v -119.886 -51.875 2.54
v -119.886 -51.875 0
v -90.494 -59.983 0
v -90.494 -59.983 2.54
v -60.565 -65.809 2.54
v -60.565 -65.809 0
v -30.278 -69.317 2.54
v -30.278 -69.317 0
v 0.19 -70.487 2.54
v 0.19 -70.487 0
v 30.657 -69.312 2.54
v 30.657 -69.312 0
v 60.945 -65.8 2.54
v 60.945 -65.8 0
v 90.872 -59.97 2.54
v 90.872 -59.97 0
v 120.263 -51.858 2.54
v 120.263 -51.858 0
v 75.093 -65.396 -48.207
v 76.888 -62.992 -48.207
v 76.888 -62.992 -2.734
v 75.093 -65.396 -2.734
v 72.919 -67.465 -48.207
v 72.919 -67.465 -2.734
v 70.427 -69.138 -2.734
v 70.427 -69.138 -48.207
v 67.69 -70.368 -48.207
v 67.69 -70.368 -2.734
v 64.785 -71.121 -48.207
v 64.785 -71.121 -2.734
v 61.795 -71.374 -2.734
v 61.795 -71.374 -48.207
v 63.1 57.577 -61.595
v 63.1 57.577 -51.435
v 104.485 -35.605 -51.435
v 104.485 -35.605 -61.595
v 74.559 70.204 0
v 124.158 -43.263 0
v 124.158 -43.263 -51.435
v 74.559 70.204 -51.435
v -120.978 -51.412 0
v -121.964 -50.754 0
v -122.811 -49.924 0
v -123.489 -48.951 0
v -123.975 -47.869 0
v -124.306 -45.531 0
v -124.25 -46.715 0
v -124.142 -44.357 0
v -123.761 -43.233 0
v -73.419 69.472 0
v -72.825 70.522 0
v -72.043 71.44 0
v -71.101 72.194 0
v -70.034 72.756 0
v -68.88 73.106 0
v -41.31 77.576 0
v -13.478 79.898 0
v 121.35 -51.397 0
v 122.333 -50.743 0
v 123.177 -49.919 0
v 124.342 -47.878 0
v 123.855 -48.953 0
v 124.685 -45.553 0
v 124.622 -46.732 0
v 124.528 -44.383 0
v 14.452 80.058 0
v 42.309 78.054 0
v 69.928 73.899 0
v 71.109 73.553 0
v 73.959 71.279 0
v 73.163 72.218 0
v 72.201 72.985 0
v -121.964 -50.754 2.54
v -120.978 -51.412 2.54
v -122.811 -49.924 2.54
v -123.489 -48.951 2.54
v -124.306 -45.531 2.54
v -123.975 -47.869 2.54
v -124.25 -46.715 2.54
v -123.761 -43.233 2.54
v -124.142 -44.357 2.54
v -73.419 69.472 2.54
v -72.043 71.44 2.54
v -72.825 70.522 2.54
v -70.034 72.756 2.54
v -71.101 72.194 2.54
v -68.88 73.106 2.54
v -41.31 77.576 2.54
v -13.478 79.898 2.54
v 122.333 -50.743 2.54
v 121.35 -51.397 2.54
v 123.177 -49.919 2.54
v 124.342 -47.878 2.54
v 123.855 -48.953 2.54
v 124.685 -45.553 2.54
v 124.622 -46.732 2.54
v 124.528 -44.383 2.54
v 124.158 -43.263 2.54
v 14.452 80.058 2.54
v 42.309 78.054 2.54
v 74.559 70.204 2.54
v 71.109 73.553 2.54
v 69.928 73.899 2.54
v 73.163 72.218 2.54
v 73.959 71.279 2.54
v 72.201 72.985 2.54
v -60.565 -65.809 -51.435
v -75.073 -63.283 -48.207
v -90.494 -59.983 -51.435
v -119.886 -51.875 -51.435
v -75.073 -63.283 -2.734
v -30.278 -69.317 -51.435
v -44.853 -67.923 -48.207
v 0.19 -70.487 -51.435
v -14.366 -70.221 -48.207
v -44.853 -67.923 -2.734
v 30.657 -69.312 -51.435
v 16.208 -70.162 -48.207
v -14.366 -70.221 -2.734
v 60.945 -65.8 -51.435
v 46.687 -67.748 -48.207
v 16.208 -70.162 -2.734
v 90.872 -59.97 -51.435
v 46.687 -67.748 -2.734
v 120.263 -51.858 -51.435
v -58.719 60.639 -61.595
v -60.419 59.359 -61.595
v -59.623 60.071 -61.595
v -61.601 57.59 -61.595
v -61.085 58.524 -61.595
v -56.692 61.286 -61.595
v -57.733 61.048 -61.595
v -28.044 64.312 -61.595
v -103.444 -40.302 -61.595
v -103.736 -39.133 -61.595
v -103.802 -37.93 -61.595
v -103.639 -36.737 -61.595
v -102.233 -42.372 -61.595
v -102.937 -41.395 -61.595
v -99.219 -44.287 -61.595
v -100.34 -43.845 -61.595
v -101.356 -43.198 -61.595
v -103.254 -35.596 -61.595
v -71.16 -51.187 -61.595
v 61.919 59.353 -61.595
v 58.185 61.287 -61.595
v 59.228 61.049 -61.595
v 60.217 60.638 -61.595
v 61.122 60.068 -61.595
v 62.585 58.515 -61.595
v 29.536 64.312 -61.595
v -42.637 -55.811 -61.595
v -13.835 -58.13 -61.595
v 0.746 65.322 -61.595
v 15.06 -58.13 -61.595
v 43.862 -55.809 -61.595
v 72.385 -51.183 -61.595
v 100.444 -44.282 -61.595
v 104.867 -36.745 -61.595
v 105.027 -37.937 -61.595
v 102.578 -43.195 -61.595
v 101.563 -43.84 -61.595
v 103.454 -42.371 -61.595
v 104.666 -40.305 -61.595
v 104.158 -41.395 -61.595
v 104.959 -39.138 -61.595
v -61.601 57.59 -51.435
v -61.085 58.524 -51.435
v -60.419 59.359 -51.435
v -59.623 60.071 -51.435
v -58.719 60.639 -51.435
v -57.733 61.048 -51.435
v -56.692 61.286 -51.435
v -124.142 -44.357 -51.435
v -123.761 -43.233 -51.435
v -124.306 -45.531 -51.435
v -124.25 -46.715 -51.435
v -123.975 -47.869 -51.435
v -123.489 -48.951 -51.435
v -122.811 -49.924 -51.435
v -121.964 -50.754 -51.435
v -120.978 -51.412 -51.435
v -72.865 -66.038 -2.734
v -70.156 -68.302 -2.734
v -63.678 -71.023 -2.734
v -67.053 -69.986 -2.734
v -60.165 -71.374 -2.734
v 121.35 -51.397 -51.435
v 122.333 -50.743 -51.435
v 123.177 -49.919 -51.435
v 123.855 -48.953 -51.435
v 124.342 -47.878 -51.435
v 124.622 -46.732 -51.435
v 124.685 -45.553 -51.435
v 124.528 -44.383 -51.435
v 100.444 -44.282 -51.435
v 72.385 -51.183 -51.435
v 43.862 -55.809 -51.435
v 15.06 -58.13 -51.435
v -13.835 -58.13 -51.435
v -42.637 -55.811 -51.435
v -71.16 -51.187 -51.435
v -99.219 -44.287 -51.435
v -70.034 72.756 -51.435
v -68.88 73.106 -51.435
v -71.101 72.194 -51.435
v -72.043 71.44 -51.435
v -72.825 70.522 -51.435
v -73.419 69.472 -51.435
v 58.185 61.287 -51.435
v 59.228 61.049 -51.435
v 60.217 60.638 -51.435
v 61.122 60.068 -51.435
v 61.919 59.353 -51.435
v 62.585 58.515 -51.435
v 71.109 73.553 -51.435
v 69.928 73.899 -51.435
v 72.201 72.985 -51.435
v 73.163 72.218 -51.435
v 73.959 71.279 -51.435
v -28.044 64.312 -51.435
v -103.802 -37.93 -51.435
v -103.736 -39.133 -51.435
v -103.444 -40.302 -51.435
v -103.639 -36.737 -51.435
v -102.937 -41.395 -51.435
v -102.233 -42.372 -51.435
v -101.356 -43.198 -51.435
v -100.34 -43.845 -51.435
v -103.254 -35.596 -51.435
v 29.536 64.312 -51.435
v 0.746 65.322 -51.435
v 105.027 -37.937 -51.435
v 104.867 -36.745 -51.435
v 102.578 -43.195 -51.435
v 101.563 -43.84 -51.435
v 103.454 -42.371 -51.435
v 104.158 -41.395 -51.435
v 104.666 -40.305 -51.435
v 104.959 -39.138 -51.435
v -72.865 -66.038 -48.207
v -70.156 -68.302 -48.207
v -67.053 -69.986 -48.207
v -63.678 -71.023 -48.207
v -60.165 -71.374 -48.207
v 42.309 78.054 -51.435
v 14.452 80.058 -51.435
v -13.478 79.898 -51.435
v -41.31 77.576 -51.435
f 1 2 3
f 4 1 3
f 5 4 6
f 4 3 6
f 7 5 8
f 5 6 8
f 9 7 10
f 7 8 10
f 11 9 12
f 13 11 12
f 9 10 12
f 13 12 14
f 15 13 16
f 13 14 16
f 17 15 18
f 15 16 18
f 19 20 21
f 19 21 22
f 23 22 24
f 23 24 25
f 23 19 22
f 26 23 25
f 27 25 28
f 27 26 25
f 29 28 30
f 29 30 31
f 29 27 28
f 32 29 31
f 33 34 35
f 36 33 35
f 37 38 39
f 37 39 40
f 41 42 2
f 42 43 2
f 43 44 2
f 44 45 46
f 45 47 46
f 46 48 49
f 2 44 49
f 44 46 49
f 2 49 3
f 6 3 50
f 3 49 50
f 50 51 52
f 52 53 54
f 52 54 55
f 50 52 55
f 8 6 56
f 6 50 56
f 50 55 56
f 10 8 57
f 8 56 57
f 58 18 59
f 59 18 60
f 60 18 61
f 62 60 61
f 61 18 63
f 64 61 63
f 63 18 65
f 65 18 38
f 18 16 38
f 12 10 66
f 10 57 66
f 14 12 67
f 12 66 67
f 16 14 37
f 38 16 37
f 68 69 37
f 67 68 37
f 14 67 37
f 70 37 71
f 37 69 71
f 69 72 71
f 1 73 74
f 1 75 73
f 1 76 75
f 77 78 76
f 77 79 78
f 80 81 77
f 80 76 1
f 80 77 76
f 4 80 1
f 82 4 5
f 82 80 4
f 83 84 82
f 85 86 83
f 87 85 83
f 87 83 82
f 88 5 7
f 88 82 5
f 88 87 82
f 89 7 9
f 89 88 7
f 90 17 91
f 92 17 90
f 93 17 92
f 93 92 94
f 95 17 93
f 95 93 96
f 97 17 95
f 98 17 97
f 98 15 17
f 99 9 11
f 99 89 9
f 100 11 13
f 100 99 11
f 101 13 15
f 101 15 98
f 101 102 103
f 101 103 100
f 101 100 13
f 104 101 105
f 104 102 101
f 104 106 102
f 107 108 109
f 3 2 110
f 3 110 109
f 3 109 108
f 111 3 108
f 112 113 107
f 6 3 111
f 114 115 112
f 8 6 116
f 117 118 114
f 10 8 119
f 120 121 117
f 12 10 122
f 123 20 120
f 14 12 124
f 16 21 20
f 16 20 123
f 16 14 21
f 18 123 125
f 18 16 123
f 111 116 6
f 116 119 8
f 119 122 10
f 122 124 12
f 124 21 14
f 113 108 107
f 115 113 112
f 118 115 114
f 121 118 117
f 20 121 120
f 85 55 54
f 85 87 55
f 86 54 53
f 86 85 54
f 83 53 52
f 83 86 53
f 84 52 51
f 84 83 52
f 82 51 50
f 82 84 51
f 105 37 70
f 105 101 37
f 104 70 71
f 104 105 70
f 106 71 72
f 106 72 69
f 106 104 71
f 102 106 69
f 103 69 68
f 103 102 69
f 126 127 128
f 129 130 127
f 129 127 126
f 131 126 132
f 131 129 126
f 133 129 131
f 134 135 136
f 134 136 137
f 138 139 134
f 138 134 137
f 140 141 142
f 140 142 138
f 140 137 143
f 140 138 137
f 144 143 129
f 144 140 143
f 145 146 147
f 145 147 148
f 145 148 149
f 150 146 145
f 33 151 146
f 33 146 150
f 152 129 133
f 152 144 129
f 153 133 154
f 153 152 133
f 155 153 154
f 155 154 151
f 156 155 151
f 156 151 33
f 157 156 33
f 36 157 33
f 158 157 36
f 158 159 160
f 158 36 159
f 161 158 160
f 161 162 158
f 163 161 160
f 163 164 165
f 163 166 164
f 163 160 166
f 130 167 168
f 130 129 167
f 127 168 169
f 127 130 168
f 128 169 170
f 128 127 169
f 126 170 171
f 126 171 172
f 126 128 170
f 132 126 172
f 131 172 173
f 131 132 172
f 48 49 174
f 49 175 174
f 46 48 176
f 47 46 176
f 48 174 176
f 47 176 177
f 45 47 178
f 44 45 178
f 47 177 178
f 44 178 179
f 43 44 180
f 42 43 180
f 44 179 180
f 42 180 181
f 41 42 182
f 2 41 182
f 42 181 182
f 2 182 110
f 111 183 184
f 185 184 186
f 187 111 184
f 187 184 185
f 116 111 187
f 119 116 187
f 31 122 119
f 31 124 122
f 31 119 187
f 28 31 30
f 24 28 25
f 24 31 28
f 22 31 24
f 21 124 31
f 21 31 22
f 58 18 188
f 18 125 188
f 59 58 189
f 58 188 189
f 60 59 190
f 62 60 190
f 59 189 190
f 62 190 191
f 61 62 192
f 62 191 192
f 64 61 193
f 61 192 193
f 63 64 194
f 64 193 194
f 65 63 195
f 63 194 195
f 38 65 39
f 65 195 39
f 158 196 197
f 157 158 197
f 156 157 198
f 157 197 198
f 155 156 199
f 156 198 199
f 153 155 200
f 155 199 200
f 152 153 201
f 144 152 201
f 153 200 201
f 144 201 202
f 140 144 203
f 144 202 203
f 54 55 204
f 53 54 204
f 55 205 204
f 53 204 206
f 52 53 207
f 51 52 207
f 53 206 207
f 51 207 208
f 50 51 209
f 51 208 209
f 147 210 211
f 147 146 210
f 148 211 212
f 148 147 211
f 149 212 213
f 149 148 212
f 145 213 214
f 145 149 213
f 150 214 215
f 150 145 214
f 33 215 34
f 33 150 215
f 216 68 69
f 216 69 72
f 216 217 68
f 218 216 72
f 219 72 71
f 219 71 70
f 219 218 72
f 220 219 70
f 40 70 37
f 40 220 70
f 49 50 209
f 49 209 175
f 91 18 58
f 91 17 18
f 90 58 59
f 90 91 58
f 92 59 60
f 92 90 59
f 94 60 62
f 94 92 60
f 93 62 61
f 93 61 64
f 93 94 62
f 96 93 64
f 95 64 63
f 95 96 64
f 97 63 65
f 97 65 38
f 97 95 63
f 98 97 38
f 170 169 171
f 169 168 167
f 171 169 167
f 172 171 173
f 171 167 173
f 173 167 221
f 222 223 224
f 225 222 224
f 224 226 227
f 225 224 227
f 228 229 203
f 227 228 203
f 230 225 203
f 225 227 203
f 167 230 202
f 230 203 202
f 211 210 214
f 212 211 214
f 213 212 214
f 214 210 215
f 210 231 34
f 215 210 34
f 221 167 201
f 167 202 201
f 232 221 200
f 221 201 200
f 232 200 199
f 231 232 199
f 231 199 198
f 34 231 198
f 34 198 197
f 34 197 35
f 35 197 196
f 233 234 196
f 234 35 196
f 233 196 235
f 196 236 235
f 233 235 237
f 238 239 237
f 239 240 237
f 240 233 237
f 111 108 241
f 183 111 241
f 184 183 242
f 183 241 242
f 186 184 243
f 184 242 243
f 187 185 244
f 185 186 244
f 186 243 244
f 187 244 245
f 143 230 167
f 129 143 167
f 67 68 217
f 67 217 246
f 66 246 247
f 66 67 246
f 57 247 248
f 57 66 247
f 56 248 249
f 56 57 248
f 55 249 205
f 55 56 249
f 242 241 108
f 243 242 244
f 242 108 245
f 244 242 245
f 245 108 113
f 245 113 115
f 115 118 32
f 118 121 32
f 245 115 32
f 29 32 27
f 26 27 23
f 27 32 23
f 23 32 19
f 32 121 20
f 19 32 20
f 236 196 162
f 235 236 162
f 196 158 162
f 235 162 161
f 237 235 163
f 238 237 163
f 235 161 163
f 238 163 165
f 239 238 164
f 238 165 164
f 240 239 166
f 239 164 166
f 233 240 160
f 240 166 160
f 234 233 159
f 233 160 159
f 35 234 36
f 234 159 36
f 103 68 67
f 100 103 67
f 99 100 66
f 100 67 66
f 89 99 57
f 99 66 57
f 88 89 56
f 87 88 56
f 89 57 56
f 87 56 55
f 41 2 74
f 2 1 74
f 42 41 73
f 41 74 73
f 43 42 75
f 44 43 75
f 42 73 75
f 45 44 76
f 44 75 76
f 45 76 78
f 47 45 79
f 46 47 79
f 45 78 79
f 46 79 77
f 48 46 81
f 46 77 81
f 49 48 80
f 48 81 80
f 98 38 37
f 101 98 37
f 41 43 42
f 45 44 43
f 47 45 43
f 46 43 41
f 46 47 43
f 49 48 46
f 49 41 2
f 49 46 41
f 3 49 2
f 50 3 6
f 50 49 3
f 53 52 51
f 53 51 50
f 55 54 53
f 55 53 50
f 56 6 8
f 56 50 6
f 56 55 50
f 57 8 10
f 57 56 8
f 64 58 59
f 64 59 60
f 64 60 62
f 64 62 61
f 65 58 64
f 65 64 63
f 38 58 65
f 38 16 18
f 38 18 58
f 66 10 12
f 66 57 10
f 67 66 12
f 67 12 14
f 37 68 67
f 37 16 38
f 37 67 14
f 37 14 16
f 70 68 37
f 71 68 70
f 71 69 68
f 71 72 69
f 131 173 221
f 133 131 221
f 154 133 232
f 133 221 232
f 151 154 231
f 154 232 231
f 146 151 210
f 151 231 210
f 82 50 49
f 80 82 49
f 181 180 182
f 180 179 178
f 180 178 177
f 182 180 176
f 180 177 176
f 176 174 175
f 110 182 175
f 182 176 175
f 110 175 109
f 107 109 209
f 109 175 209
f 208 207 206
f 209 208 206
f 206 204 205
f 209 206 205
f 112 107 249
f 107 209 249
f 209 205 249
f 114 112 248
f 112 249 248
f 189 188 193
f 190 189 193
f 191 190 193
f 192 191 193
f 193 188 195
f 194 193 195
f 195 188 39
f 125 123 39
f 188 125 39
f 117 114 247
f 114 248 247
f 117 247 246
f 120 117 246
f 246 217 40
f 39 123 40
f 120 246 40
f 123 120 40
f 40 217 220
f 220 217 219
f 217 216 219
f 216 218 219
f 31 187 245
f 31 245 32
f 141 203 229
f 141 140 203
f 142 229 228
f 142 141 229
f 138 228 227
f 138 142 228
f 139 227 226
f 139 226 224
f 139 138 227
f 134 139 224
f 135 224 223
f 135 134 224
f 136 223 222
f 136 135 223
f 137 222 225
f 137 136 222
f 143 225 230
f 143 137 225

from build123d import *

# Parameters (mm, degrees)
F1_DEPTH    = 51.435
F3_DEPTH    = 10.16
F5_DEPTH    = 2.54
F6_R        = 6.35
F6_2_R      = 6.35
F6_3_R      = 6.35
F7_W        = 151.9614458084
F7_H        = 45.4733071383
F8_DEPTH    = 71.374
F9_T1_DEPTH = 120.0136733796
F9_T3_DEPTH = 120.9407803299


# Not quite as in the source:
# - a fillet or chamfer that OpenCascade refuses, or shapes differently, is made with other operations: its cross-section is extruded or revolved along the edge and cut away or added


with BuildPart() as f1:
    # F0 (on Top) → F1 (new body)
    with BuildSketch(Plane.XY):
        with BuildLine():
            ThreePointArc((73.2254907489, 73.2552930713), (0.5247097559, 80.2488736751), (-72.0931589603, 72.4412575364))
            Line((-72.0931589603, 72.4412575364), (-126.6336739063, -49.6643856168))
            ThreePointArc((-126.6336739063, -49.6643856168), (0.1613423228, -70.4870011046), (126.956358552, -49.6643856168))
            Line((126.956358552, -49.6643856168), (73.2254907489, 73.2552930713))
        make_face()
    extrude(amount=-F1_DEPTH)

    # F6
    f6_edges = [f1.edges().sort_by_distance(p)[0] for p in [
        (-126.633674, -49.664386, -25.7175),
        (126.956359, -49.664386, -25.7175),
        (73.225491, 73.255293, -25.7175),
        (-72.093159, 72.441258, -25.7175),
    ]]
    fillet(f6_edges, radius=F6_R)

    # F7 (on Front) → F8 (join)
    with BuildSketch(Plane.XZ):
        with Locations((0.9076371789, -25.4708082648)):
            Rectangle(F7_W, F7_H)
    extrude(amount=F8_DEPTH)

    # F9: fillet of radius 17.78 on 2 edges, made by hand

    # F9_s2 → F9_t1 (cut)
    with BuildSketch(Plane.XY.offset(-85.4776449546)):
        with BuildLine():
            ThreePointArc((-75.0730857253, -63.2830532058), (-68.6460806292, -69.2208961409), (-60.1650124771, -71.374))
            Line((-60.1650124771, -71.374), (-75.0730857253, -71.374))
            Line((-75.0730857253, -71.374), (-75.0730857253, -63.2830532058))
        make_face()
    extrude(amount=F9_T1_DEPTH, mode=Mode.SUBTRACT)

    # F9_s4 → F9_t3 (cut)
    with BuildSketch(Plane.XY.offset(-85.9411984297)):
        with BuildLine():
            ThreePointArc((76.8883600831, -62.9915964801), (70.427337124, -69.1377715085), (61.7948654448, -71.374))
            Line((61.7948654448, -71.374), (76.8883600831, -71.374))
            Line((76.8883600831, -71.374), (76.8883600831, -62.9915964801))
        make_face()
    extrude(amount=F9_T3_DEPTH, mode=Mode.SUBTRACT)


with BuildPart() as f3:
    # F2 (on face) → F3 (new body)
    with BuildSketch(Plane(origin=(0, 0, -51.435), x_dir=(1, 0, 0), z_dir=(0, 0, -1))):
        with BuildLine():
            ThreePointArc((107.4105203152, 42.1924516559), (0.6039142609, 58.4204568292), (-106.2026917934, 42.1924516559))
            Line((-106.2026917934, 42.1924516559), (-60.175538063, -60.7785619795))
            ThreePointArc((-60.175538063, -60.7785619795), (0.751433894, -65.3222976326), (61.6784058511, -60.7785619795))
            Line((61.6784058511, -60.7785619795), (107.4105203152, 42.1924516559))
        make_face()
    extrude(amount=F3_DEPTH)

    # F6#2
    f6_2_edges = [f3.edges().sort_by_distance(p)[0] for p in [
        (-106.202692, -42.192452, -56.515),
        (107.41052, -42.192452, -56.515),
        (61.678406, 60.778562, -56.515),
        (-60.175538, 60.778562, -56.515),
    ]]
    fillet(f6_2_edges, radius=F6_2_R)


with BuildPart() as f5:
    # F4 (on face) → F5 (new body)
    with BuildSketch(Plane.XY):
        with BuildLine():
            ThreePointArc((-126.6336739063, -49.6643856168), (0.1613423228, -70.4870011046), (126.956358552, -49.6643856168))
            Line((126.956358552, -49.6643856168), (73.2254907489, 73.2552930713))
            ThreePointArc((73.2254907489, 73.2552930713), (0.5247097559, 80.2488736751), (-72.0931589603, 72.4412575364))
            Line((-72.0931589603, 72.4412575364), (-126.6336739063, -49.6643856168))
        make_face()
    extrude(amount=F5_DEPTH)

    # F6#3
    f6_3_edges = [f5.edges().sort_by_distance(p)[0] for p in [
        (-126.633674, -49.664386, 1.27),
        (126.956359, -49.664386, 1.27),
        (73.225491, 73.255293, 1.27),
        (-72.093159, 72.441258, 1.27),
    ]]
    fillet(f6_3_edges, radius=F6_3_R)


solid = Compound([f1.part, f3.part, f5.part])
